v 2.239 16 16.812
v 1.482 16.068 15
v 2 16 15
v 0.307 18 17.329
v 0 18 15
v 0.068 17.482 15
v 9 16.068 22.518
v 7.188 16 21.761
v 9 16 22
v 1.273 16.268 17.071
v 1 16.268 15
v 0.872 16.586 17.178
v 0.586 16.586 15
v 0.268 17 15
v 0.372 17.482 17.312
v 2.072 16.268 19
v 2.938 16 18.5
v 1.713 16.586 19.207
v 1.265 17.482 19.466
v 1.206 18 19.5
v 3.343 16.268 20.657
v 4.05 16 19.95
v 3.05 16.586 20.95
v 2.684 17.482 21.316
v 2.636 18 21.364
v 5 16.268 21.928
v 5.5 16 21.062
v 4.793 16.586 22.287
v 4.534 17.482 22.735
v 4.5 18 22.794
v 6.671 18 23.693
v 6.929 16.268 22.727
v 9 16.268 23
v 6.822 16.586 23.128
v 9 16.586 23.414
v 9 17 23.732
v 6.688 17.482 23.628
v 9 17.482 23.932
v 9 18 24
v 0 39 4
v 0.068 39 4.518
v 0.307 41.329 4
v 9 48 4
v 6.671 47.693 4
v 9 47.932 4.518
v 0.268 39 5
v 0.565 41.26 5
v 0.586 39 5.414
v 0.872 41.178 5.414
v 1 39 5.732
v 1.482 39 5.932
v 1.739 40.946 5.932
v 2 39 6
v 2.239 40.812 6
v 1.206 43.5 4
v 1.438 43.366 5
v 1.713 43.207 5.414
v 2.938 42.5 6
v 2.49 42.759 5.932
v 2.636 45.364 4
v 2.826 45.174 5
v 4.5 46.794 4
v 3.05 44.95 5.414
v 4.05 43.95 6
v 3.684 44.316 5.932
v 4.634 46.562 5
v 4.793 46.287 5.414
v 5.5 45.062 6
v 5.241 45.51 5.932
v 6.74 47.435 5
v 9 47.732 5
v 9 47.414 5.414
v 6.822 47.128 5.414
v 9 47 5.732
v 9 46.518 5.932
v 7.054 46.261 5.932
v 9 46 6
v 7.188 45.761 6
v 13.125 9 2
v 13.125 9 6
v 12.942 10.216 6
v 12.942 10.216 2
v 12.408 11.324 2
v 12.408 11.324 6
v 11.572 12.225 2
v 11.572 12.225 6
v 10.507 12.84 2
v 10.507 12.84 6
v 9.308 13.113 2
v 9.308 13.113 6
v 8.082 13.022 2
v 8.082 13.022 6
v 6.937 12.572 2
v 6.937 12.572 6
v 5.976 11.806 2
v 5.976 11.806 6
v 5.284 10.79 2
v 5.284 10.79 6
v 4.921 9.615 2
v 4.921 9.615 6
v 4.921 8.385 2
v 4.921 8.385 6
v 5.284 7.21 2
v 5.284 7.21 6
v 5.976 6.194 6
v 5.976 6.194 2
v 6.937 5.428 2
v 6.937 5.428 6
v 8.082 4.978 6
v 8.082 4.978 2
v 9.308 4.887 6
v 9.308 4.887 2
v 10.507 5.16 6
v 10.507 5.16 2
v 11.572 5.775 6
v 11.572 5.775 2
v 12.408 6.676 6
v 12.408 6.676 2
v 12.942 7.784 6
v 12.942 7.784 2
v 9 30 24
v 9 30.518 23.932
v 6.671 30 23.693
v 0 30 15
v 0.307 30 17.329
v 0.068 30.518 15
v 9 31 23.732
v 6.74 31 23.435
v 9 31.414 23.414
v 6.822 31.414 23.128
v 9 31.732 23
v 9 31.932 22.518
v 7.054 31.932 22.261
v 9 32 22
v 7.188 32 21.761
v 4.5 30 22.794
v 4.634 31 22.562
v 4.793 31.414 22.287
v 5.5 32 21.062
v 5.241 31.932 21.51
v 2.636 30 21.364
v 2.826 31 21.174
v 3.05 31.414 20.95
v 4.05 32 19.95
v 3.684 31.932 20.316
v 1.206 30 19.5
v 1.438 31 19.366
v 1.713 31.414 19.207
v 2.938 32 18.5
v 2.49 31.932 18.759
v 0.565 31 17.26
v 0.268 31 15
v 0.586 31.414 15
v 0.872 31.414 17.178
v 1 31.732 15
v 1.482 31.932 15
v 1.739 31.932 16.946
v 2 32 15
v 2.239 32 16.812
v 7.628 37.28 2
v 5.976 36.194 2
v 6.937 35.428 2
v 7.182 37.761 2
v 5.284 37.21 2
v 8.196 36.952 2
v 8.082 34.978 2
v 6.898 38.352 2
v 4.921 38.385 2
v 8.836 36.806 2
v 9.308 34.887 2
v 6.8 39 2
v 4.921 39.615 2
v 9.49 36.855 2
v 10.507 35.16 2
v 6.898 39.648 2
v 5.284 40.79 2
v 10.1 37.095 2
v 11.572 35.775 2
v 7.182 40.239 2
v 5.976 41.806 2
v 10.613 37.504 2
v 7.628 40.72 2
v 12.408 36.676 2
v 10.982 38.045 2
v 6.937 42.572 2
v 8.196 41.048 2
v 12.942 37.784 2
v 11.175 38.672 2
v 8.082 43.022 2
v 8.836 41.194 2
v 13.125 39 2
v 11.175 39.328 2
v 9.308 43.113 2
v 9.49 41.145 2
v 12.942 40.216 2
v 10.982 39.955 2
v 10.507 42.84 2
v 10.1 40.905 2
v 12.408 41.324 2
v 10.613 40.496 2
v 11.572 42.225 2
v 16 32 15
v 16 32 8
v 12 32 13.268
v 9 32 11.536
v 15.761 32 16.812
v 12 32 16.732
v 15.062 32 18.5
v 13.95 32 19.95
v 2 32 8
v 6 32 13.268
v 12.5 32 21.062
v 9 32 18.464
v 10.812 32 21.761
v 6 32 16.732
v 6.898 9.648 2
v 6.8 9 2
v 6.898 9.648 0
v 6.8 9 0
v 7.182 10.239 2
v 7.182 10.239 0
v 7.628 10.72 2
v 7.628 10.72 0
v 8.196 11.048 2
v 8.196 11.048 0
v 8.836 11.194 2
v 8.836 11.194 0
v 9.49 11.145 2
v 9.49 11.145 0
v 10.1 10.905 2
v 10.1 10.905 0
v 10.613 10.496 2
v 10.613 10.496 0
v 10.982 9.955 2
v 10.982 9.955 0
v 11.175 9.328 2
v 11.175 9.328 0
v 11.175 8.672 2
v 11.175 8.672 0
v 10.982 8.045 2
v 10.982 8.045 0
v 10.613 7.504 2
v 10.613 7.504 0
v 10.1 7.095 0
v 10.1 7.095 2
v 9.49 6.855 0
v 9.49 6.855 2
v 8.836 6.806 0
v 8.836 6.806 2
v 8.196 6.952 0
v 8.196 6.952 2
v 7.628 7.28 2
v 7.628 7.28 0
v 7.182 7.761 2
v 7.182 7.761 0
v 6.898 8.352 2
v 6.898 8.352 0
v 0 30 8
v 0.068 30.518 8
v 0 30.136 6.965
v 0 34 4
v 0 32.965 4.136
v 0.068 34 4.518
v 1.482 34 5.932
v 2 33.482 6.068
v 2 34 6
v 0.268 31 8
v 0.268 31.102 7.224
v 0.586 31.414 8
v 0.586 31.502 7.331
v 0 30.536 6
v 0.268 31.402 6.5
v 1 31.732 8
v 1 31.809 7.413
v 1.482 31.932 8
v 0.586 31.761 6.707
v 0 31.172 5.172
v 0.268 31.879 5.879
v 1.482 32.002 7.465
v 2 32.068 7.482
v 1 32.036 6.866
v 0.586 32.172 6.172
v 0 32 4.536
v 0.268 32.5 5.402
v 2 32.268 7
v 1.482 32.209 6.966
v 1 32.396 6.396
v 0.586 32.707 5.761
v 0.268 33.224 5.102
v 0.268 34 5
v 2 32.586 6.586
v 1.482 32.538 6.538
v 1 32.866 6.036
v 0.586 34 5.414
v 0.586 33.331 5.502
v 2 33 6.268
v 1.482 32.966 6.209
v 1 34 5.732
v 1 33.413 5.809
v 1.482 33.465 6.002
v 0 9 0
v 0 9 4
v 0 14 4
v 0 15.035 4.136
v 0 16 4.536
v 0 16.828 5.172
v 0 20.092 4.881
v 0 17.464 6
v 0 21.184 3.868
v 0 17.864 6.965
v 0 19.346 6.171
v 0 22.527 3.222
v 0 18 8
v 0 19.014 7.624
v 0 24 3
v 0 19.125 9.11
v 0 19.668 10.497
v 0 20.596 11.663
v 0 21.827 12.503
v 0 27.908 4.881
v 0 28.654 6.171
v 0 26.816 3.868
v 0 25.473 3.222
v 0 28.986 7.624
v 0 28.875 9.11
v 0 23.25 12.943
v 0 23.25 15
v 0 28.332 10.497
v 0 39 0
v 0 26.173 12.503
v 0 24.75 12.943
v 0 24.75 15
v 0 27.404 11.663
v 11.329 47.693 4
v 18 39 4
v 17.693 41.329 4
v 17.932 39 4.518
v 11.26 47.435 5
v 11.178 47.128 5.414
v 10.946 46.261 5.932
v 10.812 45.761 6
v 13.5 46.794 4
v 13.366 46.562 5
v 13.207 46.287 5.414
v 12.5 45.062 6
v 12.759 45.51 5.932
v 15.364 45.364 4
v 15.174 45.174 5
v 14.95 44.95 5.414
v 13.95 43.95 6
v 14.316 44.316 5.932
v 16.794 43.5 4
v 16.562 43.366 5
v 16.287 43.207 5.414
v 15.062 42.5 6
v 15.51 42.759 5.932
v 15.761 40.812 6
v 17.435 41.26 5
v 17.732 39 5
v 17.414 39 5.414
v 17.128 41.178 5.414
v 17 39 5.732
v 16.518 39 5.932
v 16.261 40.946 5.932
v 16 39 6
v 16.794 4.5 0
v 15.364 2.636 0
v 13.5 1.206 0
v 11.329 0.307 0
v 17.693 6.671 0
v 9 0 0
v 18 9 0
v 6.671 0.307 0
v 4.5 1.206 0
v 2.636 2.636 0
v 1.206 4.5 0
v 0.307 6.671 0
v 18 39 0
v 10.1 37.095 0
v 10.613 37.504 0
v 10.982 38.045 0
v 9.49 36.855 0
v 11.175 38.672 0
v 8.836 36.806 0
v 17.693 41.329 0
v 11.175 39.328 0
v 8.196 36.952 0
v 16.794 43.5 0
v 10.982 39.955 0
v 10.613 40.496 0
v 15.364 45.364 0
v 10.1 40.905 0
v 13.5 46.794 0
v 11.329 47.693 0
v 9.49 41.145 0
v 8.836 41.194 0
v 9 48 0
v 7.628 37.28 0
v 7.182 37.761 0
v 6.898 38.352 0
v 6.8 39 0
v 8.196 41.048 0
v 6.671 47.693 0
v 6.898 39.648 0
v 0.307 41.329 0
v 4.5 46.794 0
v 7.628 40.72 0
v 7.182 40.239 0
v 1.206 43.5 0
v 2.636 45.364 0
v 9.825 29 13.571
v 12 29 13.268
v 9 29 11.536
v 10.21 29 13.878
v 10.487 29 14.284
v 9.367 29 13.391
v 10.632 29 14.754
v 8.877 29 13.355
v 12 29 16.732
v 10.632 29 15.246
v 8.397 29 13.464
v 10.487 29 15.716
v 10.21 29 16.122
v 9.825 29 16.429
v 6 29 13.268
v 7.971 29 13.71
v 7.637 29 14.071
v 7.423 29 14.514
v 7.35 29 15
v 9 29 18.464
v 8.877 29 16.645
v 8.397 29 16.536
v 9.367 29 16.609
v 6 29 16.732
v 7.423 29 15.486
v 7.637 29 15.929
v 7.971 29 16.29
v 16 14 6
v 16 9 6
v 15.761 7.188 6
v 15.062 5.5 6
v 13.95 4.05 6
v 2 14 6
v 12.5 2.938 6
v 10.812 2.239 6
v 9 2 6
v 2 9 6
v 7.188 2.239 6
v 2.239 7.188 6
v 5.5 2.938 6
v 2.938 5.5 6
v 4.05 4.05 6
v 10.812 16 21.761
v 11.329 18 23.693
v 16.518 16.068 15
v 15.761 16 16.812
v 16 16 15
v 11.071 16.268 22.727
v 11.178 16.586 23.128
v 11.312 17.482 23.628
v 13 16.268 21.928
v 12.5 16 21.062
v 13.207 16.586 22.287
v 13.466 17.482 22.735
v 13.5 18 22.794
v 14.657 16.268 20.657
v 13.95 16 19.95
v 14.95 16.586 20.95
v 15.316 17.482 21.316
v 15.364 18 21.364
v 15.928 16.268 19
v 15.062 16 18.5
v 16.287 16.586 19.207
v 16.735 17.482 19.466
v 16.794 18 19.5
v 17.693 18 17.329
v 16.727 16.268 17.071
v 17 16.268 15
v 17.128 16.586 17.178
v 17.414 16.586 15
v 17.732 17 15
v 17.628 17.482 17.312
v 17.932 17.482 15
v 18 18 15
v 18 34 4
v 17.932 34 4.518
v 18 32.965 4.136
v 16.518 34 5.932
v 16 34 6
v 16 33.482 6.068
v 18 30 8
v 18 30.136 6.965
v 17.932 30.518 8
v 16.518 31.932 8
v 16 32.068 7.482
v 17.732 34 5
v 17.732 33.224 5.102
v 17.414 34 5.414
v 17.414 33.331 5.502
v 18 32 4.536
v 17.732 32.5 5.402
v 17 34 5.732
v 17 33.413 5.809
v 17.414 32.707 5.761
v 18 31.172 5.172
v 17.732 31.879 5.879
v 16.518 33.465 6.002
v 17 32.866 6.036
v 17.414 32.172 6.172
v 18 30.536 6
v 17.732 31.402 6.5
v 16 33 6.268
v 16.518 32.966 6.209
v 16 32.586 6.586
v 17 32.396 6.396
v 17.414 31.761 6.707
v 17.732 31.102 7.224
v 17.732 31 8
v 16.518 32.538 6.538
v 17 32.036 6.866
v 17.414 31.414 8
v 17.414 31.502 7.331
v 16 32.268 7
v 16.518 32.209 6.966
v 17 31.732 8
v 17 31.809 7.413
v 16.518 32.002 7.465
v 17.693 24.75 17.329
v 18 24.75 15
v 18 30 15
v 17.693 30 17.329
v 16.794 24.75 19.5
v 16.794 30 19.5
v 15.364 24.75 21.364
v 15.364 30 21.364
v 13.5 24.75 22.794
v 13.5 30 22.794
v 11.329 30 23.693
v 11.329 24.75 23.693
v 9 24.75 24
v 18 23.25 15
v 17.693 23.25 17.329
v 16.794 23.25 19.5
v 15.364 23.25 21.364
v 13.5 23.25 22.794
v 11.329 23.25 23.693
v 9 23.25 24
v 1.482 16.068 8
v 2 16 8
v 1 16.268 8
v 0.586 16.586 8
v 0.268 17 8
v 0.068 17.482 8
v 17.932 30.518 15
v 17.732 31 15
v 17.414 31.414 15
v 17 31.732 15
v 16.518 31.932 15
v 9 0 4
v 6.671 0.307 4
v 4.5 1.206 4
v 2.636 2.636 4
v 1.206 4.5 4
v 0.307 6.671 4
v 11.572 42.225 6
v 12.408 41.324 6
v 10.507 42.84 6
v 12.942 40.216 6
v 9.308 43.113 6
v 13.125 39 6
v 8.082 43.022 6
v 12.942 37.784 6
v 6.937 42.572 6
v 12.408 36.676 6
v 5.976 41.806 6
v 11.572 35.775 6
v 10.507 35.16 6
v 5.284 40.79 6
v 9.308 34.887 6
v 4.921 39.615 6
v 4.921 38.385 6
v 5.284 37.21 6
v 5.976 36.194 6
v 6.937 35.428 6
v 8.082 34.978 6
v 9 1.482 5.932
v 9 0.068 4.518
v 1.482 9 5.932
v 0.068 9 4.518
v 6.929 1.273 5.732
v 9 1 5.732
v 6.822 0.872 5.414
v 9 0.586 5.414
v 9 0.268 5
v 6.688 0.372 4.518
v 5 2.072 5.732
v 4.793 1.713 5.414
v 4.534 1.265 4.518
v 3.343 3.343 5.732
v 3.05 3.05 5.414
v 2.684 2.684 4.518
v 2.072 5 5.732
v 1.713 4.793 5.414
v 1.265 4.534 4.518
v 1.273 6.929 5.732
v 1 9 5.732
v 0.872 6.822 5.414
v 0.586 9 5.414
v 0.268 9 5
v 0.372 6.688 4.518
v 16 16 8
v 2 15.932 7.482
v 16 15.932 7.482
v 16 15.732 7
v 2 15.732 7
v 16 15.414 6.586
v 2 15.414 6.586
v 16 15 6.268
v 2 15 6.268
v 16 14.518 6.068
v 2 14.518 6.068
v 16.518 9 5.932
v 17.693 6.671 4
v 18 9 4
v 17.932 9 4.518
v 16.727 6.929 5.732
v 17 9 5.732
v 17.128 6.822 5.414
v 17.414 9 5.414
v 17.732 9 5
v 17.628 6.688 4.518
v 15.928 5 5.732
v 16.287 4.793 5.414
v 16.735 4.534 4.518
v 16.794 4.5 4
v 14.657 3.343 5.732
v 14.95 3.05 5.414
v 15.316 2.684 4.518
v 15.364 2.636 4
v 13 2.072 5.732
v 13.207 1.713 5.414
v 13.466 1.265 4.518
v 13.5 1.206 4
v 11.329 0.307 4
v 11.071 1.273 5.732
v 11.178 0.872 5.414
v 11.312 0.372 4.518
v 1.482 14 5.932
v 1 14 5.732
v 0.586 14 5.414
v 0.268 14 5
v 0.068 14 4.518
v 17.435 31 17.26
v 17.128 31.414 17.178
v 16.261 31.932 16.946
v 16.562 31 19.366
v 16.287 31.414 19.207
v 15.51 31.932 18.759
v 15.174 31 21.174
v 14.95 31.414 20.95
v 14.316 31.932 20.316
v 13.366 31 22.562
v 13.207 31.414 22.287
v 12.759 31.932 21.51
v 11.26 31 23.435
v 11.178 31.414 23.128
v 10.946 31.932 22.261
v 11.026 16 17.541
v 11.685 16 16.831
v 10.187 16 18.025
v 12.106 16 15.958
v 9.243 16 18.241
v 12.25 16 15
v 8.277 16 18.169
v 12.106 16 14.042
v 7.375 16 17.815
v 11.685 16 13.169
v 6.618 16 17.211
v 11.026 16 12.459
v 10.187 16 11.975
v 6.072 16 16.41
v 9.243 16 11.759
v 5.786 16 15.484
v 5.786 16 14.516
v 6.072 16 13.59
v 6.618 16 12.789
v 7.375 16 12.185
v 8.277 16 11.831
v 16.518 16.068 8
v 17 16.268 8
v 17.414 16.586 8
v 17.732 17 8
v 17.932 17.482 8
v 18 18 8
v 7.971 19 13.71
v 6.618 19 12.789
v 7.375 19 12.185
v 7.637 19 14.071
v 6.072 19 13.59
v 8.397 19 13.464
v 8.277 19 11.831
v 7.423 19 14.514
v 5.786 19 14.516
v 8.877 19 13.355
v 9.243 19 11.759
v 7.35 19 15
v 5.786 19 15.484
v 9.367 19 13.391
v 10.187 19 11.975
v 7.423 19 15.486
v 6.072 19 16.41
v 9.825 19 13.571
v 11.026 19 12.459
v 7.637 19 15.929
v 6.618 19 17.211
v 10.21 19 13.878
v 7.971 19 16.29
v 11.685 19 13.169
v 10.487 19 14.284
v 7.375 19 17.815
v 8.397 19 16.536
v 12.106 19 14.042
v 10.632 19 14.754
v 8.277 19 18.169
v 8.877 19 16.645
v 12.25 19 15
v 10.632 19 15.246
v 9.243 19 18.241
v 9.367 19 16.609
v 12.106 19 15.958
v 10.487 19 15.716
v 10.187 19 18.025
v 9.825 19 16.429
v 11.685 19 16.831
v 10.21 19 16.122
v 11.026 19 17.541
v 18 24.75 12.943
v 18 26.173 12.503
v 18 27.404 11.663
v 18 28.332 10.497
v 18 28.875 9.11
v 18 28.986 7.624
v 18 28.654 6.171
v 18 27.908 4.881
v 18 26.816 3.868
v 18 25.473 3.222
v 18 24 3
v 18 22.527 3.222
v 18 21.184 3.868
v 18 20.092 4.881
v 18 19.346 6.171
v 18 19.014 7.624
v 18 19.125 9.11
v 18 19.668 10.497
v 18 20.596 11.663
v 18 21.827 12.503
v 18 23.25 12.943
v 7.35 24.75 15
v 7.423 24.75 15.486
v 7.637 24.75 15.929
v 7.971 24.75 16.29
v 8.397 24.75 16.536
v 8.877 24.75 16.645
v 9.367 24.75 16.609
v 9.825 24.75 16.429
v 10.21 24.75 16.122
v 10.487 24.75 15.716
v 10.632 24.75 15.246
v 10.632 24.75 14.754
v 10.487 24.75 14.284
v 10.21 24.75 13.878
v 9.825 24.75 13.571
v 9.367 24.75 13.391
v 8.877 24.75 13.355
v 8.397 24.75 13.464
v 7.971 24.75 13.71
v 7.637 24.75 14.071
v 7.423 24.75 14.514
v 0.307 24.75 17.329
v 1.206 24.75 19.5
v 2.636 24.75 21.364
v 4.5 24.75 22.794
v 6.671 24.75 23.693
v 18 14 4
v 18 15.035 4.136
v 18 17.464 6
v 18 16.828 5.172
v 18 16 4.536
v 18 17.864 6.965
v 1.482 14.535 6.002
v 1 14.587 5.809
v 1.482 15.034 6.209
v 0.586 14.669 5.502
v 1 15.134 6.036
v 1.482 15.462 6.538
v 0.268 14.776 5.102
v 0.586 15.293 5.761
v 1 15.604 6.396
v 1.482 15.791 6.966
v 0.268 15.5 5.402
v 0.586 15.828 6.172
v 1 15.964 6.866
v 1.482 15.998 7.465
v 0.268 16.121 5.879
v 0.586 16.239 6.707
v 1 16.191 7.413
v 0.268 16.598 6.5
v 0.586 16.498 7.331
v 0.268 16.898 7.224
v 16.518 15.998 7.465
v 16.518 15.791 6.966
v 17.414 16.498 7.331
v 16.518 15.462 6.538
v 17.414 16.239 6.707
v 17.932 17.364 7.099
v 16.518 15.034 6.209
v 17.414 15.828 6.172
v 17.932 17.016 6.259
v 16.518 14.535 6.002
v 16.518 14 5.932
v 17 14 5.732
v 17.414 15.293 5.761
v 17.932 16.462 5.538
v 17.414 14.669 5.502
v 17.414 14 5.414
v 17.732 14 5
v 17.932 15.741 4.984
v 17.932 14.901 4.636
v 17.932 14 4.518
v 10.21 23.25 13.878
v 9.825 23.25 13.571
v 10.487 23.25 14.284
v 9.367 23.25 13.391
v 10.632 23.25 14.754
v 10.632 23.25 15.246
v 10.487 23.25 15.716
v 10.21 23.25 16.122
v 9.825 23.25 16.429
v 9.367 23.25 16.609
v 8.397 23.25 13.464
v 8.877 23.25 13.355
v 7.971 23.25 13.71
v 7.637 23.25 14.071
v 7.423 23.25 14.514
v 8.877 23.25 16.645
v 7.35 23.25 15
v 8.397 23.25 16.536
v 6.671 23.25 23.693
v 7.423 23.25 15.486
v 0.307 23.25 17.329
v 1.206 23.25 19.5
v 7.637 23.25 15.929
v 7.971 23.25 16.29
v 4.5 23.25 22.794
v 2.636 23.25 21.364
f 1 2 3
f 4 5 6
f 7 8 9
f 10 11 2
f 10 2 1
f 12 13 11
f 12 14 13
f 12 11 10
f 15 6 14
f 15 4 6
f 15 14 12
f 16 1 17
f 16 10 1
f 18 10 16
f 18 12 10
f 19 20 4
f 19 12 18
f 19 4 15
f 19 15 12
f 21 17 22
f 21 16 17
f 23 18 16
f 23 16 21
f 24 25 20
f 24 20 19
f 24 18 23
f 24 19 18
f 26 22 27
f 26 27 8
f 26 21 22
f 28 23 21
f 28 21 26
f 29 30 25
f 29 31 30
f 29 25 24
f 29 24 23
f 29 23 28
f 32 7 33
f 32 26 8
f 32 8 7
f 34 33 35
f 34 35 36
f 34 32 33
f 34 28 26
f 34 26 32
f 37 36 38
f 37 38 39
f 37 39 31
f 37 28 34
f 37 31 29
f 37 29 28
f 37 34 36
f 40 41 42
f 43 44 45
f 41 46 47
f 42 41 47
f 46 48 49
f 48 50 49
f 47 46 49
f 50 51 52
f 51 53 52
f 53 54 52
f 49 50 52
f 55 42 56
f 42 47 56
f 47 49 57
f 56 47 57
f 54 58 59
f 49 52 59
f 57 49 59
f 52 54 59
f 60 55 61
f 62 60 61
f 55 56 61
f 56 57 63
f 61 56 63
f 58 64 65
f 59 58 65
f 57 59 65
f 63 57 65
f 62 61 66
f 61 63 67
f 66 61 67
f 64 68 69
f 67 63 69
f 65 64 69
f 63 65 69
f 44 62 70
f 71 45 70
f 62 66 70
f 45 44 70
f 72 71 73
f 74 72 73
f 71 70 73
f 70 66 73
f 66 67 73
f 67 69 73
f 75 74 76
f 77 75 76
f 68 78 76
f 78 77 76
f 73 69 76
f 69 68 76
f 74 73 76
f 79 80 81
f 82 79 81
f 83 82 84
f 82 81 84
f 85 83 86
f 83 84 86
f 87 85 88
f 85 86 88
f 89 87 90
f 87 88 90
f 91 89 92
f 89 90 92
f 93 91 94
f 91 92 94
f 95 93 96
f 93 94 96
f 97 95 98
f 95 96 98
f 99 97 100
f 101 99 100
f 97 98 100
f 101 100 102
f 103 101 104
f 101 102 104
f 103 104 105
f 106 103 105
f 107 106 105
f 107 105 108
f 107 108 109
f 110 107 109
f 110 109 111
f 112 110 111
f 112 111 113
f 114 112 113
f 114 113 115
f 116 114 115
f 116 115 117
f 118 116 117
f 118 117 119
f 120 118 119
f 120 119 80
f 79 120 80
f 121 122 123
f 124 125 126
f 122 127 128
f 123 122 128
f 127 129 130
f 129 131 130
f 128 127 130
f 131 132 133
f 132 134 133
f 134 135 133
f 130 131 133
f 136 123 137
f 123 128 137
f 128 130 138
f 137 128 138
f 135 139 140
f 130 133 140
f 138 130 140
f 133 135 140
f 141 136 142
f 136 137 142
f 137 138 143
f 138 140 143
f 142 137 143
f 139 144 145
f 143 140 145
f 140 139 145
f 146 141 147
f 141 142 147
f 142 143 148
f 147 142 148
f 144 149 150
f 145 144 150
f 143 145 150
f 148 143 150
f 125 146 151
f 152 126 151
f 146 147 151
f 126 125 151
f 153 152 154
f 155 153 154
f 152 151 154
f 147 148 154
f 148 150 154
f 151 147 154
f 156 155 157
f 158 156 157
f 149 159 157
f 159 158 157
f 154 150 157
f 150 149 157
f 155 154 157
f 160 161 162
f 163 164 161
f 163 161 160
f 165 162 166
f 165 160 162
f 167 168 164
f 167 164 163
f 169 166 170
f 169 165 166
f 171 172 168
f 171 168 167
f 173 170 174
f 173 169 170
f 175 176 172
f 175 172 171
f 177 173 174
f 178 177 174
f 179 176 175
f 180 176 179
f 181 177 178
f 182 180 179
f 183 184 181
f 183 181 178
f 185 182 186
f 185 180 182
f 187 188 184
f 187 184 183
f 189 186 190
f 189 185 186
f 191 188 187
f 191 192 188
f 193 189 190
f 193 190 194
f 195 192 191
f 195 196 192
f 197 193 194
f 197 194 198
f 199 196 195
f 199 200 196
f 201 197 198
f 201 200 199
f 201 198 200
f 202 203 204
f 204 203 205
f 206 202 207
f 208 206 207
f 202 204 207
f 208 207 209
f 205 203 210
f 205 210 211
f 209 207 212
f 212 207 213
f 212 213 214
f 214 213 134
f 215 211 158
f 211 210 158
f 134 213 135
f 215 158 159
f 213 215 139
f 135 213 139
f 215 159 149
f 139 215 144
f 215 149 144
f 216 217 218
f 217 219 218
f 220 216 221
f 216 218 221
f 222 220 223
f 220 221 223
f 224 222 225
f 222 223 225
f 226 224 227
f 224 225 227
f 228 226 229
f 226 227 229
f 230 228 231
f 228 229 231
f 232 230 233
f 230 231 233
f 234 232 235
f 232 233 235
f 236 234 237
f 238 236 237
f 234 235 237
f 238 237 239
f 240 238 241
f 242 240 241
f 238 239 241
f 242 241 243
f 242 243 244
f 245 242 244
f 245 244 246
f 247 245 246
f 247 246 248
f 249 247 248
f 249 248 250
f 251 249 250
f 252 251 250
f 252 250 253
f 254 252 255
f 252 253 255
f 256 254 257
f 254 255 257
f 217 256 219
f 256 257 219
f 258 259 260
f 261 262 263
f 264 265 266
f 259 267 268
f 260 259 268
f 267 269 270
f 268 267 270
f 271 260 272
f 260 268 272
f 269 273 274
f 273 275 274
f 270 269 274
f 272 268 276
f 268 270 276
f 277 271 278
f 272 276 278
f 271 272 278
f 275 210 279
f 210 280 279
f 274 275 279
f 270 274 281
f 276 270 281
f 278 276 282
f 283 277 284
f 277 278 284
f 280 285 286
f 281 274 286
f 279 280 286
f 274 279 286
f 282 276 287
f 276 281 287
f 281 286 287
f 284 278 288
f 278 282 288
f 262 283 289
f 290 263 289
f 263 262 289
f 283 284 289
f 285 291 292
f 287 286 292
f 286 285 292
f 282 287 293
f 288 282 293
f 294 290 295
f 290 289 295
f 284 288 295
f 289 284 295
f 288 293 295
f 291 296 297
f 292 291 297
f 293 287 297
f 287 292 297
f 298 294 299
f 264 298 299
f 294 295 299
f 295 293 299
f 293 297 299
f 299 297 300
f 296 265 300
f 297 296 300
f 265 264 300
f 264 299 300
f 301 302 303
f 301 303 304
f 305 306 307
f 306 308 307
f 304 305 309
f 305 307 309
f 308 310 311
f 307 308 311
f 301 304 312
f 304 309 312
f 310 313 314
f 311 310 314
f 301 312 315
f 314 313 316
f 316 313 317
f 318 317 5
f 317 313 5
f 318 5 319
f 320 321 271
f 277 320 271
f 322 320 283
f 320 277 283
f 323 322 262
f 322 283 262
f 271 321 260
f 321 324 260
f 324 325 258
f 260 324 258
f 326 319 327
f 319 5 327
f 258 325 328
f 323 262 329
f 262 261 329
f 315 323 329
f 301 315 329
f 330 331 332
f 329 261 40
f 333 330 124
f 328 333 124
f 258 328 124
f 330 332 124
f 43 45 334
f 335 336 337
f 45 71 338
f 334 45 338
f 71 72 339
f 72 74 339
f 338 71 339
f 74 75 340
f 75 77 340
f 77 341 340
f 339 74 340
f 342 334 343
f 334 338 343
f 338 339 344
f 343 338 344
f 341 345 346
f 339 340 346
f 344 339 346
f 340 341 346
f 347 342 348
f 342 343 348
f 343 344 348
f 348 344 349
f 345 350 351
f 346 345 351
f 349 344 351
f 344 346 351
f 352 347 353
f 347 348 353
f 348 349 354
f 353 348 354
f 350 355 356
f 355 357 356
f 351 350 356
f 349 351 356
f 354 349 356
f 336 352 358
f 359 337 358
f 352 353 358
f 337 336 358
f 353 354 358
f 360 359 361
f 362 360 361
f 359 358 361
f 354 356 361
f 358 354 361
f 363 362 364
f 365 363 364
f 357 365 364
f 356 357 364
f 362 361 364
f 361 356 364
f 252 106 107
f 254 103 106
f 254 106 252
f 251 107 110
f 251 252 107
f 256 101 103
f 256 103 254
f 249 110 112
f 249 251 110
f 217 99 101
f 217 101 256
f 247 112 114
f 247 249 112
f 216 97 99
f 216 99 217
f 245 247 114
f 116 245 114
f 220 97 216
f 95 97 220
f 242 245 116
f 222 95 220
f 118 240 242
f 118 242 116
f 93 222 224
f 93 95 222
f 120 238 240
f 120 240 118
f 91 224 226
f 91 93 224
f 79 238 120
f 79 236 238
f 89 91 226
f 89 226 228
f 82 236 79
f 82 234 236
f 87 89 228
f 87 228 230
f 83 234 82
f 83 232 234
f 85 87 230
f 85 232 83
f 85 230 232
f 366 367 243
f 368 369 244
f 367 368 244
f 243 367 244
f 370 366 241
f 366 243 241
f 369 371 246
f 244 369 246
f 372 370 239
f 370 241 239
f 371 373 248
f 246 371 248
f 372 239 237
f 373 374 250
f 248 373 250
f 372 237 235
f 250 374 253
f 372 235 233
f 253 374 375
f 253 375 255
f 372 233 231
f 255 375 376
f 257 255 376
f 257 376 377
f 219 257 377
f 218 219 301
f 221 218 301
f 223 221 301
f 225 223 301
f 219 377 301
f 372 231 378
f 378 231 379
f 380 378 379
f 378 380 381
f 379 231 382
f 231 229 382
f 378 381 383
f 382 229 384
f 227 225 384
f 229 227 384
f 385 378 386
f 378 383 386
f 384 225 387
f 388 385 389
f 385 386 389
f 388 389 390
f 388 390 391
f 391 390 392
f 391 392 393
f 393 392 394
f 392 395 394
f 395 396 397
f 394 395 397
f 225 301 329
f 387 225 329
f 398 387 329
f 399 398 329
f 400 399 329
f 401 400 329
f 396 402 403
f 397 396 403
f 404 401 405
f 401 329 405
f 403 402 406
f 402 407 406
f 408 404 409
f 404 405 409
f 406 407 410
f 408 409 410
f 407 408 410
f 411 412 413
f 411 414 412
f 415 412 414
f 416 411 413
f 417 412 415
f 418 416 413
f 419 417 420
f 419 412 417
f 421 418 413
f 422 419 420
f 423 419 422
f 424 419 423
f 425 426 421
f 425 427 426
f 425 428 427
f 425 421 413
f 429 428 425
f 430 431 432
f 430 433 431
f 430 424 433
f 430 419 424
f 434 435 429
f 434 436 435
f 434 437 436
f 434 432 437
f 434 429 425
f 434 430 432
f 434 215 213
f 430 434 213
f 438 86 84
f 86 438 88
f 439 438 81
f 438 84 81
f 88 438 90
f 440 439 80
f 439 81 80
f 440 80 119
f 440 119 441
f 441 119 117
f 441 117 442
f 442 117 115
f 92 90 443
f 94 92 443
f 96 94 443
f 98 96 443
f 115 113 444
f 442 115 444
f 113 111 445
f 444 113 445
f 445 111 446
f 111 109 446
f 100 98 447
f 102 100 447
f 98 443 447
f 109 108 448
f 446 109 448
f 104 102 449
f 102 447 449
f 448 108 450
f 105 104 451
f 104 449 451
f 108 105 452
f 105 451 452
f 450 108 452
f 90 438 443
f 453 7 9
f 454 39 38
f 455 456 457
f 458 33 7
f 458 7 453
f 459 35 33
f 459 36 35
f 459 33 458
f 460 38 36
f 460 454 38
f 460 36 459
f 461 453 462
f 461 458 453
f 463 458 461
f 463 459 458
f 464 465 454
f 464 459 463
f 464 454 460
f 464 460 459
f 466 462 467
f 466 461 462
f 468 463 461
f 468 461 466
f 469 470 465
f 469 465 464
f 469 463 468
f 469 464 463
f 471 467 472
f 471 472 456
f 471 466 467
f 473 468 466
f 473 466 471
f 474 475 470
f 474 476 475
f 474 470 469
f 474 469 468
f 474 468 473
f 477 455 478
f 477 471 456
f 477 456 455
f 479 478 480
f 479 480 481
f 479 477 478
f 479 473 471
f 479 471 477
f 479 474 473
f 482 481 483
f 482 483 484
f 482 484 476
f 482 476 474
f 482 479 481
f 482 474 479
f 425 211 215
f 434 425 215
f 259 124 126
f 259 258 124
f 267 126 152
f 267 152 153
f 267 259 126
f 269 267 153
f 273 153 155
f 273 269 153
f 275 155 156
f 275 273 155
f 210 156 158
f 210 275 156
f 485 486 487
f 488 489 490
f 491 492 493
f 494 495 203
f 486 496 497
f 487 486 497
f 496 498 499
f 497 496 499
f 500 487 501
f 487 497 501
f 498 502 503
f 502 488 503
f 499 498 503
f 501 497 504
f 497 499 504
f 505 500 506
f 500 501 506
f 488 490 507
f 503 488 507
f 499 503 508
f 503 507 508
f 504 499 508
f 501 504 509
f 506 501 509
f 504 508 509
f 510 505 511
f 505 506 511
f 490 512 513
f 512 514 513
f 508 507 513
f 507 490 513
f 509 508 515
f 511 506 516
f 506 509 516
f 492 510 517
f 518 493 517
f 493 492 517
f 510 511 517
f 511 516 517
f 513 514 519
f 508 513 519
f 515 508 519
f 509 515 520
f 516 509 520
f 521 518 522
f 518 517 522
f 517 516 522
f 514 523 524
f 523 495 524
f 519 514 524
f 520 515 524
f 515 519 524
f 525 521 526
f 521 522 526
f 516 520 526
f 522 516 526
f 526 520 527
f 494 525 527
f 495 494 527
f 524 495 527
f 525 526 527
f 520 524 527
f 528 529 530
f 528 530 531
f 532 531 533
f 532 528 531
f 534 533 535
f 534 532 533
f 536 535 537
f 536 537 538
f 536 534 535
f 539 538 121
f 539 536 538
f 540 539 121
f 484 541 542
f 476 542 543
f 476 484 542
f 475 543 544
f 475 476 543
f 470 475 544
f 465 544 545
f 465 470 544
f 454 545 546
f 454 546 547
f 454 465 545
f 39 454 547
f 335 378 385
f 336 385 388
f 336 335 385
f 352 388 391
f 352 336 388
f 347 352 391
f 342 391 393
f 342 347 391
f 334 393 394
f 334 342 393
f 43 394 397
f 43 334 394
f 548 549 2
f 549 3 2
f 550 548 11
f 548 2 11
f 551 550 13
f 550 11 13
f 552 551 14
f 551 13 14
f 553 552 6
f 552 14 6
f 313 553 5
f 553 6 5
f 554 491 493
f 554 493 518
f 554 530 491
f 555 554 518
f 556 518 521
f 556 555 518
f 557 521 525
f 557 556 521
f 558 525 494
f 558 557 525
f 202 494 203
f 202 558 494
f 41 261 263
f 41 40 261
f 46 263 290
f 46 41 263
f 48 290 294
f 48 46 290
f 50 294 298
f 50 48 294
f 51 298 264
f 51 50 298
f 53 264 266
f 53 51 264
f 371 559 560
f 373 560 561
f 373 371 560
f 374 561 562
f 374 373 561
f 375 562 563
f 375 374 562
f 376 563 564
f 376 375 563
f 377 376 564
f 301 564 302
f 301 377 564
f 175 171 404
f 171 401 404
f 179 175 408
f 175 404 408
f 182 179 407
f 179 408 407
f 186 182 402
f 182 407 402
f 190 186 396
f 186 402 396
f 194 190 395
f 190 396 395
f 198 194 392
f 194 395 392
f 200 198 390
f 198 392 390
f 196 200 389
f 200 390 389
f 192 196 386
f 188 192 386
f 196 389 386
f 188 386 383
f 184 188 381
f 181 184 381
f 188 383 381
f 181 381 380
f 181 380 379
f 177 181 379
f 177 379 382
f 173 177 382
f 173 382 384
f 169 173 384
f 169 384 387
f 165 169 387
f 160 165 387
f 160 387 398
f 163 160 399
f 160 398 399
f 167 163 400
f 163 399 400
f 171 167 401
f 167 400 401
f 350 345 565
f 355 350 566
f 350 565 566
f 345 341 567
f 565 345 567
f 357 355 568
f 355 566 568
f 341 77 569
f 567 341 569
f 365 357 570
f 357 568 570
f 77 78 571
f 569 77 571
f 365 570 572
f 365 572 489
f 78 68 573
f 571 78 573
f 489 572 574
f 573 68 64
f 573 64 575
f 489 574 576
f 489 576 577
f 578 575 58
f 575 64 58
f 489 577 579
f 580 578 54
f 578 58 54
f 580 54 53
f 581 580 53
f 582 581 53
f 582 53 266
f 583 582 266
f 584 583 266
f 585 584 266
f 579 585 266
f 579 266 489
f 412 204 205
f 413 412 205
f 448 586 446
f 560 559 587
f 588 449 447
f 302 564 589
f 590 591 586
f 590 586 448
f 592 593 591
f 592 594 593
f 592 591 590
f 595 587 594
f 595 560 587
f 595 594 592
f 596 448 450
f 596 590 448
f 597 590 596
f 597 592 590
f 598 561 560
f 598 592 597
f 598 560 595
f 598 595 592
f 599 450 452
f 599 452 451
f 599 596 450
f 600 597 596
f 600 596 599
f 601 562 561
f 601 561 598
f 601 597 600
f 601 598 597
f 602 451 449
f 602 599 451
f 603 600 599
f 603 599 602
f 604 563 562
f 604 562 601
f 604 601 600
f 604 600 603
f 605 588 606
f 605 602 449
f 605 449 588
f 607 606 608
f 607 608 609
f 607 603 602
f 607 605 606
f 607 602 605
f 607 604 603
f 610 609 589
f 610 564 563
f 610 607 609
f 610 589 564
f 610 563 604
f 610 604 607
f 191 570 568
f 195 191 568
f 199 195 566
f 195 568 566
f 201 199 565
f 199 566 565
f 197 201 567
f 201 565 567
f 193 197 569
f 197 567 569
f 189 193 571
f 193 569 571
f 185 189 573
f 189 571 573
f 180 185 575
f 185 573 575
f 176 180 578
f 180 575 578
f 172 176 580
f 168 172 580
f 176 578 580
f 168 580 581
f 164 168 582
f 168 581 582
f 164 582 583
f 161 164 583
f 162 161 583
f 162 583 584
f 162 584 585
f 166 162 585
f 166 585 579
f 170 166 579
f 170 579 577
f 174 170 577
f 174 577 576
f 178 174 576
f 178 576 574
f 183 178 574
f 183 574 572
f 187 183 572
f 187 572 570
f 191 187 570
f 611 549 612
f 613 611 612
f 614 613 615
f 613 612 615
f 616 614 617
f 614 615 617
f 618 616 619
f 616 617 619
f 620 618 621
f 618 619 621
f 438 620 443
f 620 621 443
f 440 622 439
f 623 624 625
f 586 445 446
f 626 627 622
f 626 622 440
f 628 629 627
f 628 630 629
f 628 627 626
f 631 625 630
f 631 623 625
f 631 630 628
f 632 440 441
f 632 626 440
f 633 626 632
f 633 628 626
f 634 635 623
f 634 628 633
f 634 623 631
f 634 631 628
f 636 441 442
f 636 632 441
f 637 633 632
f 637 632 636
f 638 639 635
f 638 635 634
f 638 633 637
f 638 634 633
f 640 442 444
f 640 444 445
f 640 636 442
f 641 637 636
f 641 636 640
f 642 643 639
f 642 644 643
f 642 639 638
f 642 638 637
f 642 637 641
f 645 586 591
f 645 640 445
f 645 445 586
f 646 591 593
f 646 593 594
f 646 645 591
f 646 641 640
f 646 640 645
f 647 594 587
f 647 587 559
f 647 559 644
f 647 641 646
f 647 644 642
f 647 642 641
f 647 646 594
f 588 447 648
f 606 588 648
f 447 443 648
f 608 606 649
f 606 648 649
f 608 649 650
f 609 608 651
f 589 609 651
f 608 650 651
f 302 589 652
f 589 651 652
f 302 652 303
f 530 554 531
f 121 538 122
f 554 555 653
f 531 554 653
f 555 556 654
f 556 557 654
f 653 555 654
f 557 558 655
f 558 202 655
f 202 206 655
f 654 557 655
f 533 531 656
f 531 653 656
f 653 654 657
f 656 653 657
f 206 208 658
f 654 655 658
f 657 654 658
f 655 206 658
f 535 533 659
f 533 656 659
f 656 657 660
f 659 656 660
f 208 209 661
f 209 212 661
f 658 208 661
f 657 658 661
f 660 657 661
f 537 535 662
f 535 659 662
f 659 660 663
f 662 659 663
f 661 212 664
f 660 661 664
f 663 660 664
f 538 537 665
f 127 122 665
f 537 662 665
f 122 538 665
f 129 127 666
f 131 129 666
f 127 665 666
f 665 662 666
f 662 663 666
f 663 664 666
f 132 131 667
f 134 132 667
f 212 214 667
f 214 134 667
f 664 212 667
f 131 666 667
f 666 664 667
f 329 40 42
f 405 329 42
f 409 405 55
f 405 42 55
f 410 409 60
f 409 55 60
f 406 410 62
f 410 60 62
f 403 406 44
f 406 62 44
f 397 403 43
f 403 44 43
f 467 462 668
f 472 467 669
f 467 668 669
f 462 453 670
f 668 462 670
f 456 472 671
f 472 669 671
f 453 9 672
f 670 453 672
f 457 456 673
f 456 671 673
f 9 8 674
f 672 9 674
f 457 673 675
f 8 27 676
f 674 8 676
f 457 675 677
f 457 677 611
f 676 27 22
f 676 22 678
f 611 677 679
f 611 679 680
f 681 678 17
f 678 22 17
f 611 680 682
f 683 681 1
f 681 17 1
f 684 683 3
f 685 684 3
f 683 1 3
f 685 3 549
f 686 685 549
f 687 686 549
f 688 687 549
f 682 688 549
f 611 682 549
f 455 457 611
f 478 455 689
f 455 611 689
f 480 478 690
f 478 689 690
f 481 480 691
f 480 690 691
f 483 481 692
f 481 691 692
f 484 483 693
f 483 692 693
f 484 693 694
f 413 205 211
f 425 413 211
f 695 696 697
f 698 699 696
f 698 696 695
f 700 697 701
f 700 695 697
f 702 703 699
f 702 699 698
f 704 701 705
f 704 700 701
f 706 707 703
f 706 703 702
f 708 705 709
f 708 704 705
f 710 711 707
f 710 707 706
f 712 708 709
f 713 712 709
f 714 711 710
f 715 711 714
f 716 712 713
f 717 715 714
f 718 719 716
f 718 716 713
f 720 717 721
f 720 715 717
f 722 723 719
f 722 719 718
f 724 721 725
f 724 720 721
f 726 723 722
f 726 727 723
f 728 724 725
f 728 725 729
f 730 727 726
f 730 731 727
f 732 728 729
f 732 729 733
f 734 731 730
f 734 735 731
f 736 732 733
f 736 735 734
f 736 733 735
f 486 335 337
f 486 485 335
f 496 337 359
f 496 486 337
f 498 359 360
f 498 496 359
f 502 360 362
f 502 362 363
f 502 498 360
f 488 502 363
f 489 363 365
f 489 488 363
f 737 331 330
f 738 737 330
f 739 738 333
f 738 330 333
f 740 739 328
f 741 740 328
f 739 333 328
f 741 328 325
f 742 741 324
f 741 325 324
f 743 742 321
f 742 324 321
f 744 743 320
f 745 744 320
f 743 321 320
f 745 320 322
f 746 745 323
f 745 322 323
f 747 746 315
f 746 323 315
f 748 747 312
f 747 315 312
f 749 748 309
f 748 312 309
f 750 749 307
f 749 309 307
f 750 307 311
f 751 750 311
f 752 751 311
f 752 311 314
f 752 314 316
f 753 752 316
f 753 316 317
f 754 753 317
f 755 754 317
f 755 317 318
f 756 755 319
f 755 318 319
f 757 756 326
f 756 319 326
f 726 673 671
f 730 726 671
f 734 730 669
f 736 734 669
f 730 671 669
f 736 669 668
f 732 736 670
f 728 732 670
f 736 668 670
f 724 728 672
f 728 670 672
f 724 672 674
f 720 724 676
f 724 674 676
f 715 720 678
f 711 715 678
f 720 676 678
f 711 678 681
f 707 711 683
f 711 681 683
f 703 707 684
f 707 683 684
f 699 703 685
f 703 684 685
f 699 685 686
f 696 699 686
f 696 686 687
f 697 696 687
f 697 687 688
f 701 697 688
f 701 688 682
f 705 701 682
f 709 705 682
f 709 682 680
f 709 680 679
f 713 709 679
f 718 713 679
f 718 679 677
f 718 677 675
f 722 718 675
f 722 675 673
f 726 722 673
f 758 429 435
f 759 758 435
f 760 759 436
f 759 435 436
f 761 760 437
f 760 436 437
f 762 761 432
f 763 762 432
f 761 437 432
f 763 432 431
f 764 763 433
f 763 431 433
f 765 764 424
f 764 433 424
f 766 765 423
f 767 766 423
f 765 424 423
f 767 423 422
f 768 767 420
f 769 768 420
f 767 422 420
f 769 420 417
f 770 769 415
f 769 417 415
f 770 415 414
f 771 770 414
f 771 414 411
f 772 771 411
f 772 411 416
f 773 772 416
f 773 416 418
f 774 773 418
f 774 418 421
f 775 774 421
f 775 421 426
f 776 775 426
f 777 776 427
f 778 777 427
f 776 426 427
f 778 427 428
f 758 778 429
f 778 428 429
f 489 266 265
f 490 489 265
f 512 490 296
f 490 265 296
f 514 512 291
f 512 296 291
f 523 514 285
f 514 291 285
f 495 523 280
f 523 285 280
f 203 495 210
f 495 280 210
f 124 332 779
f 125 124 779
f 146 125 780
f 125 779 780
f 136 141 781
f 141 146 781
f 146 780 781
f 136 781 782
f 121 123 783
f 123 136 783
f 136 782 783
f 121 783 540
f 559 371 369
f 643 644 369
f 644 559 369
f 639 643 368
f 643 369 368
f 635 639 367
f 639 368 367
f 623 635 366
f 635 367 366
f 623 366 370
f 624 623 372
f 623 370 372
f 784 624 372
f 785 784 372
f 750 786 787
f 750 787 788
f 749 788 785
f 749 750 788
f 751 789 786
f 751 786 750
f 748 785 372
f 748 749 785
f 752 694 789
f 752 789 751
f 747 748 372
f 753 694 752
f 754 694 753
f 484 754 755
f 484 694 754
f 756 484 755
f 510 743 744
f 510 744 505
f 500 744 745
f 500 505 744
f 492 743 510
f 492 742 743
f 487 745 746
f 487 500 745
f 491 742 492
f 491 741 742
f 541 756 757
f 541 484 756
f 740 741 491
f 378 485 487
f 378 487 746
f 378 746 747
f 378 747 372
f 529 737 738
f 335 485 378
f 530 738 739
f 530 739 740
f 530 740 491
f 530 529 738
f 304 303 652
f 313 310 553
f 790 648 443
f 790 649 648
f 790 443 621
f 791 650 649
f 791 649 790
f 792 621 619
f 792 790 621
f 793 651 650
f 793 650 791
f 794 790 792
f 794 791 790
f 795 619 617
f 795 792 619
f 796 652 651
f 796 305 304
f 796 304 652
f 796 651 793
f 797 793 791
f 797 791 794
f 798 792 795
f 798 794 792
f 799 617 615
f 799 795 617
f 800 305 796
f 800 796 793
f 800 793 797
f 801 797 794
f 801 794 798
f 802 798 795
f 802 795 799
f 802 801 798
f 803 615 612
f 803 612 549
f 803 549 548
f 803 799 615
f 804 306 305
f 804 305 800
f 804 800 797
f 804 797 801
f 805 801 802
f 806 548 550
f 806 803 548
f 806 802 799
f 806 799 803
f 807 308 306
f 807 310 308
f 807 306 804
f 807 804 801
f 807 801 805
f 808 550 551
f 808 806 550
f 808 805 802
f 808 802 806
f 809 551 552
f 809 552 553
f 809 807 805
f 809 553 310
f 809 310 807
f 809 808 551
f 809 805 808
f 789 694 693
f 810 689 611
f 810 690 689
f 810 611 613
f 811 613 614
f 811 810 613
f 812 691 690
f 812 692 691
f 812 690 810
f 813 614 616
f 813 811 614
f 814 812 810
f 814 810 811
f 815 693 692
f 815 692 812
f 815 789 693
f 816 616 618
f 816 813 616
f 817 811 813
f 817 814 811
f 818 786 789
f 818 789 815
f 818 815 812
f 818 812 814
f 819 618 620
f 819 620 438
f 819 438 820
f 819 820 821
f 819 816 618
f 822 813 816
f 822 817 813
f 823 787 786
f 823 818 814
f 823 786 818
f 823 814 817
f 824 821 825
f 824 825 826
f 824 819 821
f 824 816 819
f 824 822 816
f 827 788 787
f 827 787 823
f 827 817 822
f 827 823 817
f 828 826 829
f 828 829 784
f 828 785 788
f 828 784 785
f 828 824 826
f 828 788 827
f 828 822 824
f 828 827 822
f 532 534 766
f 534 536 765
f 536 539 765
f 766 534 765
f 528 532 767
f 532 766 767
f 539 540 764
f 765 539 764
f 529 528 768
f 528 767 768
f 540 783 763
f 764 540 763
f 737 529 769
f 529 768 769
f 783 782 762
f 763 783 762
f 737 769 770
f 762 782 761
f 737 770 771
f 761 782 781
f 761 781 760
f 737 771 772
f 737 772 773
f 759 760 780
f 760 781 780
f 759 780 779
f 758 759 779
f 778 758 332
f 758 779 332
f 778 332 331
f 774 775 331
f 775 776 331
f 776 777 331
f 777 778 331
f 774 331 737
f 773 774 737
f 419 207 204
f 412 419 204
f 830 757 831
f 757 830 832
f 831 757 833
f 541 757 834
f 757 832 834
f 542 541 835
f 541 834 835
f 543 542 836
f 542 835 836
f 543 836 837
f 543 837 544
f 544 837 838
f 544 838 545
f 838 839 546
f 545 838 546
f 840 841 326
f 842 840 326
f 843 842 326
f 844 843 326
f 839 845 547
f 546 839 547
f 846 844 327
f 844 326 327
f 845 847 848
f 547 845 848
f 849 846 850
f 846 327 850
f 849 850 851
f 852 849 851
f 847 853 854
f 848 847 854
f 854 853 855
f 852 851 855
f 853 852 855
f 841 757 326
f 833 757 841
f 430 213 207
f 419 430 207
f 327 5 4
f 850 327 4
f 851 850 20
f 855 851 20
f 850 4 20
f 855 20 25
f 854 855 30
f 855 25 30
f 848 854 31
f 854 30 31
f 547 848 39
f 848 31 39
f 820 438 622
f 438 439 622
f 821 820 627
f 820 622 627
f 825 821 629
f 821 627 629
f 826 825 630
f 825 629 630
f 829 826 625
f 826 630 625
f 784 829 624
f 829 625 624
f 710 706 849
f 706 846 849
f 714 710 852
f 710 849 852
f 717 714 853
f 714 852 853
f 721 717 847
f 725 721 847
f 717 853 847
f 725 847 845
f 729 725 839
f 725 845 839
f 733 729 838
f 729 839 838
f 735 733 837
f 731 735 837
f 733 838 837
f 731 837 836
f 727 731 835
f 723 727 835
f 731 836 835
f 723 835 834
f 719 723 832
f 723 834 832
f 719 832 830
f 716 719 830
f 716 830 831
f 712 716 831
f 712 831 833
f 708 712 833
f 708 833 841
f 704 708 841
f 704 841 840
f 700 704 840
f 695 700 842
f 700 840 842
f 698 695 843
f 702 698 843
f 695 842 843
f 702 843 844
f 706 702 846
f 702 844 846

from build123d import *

# Parameters (mm, degrees)
F1_DEPTH       = 18
F4_D           = 4.4
F4_CBORE_D     = 8.25
F4_CBORE_DEPTH = 4
F5_R           = 8.99999
F6_R           = 2
F7_D           = 3.3
F7_CBORE_D     = 6.5
F7_CBORE_DEPTH = 3
F9_DEPTH       = 3


# Not quite as in the source:
# - a fillet or chamfer is up to 0.001 mm smaller than in the source, because OpenCascade refuses the exact size


with BuildPart() as f1:
    # F0 (on Right) → F1 (new body)
    with BuildSketch(Plane.YZ):
        with BuildLine():
            Line((0, 6), (0, 0))
            Line((0, 0), (48, 0))
            Line((48, 0), (48, 6))
            Line((48, 6), (34, 6))
            ThreePointArc((34, 6), (32.5857864376, 6.5857864376), (32, 8))
            Line((32, 8), (32, 24))
            Line((32, 24), (24.75, 24))
            Line((24.75, 24), (24.75, 12.9434299833))
            ThreePointArc((24.75, 12.9434299833), (24, 3), (23.25, 12.9434299833))
            Line((23.25, 12.9434299833), (23.25, 24))
            Line((23.25, 24), (16, 24))
            Line((16, 24), (16, 8))
            ThreePointArc((16, 8), (15.4142135624, 6.5857864376), (14, 6))
            Line((14, 6), (0, 6))
        make_face()
    extrude(amount=F1_DEPTH)

    # F4 (through all)
    with Locations(Plane.XY.offset(6)):
        with Locations((9, 9), (9, 39)):
            CounterBoreHole(F4_D / 2, F4_CBORE_D / 2, F4_CBORE_DEPTH)

    # F5 (radius 9 in the source; OpenCascade refuses exactly that, so slightly less here)
    f5_edges = [f1.edges().sort_by_distance(p)[0] for p in [
        (18, 0, 3),
        (0, 0, 3),
        (18, 48, 3),
        (0, 48, 3),
        (0, 28.375, 24),
        (0, 19.625, 24),
        (18, 19.625, 24),
        (18, 28.375, 24),
    ]]
    fillet(f5_edges, radius=F5_R)

    # F6
    f6_edges = [f1.edges().sort_by_distance(p)[0] for p in [
        (18, 11.499995, 6),
        (18, 36.500005, 6),
    ]]
    fillet(f6_edges, radius=F6_R)

    # F7 (through all)
    with Locations(Plane.XZ.offset(-16)):
        with Locations((9, 15)):
            CounterBoreHole(F7_D / 2, F7_CBORE_D / 2, F7_CBORE_DEPTH)

    # F8 (on face) → F9 (cut)
    with BuildSketch(Plane(origin=(0, 32, 0), x_dir=(-1, 0, 0), z_dir=(0, 1, 0))):
        Polygon((-6, 13.2679491924), (-6, 16.7320508076), (-9, 18.4641016151), (-12, 16.7320508076), (-12, 13.2679491924), (-9, 11.5358983849), align=None)
    extrude(amount=-F9_DEPTH, mode=Mode.SUBTRACT)


solid = f1.part
